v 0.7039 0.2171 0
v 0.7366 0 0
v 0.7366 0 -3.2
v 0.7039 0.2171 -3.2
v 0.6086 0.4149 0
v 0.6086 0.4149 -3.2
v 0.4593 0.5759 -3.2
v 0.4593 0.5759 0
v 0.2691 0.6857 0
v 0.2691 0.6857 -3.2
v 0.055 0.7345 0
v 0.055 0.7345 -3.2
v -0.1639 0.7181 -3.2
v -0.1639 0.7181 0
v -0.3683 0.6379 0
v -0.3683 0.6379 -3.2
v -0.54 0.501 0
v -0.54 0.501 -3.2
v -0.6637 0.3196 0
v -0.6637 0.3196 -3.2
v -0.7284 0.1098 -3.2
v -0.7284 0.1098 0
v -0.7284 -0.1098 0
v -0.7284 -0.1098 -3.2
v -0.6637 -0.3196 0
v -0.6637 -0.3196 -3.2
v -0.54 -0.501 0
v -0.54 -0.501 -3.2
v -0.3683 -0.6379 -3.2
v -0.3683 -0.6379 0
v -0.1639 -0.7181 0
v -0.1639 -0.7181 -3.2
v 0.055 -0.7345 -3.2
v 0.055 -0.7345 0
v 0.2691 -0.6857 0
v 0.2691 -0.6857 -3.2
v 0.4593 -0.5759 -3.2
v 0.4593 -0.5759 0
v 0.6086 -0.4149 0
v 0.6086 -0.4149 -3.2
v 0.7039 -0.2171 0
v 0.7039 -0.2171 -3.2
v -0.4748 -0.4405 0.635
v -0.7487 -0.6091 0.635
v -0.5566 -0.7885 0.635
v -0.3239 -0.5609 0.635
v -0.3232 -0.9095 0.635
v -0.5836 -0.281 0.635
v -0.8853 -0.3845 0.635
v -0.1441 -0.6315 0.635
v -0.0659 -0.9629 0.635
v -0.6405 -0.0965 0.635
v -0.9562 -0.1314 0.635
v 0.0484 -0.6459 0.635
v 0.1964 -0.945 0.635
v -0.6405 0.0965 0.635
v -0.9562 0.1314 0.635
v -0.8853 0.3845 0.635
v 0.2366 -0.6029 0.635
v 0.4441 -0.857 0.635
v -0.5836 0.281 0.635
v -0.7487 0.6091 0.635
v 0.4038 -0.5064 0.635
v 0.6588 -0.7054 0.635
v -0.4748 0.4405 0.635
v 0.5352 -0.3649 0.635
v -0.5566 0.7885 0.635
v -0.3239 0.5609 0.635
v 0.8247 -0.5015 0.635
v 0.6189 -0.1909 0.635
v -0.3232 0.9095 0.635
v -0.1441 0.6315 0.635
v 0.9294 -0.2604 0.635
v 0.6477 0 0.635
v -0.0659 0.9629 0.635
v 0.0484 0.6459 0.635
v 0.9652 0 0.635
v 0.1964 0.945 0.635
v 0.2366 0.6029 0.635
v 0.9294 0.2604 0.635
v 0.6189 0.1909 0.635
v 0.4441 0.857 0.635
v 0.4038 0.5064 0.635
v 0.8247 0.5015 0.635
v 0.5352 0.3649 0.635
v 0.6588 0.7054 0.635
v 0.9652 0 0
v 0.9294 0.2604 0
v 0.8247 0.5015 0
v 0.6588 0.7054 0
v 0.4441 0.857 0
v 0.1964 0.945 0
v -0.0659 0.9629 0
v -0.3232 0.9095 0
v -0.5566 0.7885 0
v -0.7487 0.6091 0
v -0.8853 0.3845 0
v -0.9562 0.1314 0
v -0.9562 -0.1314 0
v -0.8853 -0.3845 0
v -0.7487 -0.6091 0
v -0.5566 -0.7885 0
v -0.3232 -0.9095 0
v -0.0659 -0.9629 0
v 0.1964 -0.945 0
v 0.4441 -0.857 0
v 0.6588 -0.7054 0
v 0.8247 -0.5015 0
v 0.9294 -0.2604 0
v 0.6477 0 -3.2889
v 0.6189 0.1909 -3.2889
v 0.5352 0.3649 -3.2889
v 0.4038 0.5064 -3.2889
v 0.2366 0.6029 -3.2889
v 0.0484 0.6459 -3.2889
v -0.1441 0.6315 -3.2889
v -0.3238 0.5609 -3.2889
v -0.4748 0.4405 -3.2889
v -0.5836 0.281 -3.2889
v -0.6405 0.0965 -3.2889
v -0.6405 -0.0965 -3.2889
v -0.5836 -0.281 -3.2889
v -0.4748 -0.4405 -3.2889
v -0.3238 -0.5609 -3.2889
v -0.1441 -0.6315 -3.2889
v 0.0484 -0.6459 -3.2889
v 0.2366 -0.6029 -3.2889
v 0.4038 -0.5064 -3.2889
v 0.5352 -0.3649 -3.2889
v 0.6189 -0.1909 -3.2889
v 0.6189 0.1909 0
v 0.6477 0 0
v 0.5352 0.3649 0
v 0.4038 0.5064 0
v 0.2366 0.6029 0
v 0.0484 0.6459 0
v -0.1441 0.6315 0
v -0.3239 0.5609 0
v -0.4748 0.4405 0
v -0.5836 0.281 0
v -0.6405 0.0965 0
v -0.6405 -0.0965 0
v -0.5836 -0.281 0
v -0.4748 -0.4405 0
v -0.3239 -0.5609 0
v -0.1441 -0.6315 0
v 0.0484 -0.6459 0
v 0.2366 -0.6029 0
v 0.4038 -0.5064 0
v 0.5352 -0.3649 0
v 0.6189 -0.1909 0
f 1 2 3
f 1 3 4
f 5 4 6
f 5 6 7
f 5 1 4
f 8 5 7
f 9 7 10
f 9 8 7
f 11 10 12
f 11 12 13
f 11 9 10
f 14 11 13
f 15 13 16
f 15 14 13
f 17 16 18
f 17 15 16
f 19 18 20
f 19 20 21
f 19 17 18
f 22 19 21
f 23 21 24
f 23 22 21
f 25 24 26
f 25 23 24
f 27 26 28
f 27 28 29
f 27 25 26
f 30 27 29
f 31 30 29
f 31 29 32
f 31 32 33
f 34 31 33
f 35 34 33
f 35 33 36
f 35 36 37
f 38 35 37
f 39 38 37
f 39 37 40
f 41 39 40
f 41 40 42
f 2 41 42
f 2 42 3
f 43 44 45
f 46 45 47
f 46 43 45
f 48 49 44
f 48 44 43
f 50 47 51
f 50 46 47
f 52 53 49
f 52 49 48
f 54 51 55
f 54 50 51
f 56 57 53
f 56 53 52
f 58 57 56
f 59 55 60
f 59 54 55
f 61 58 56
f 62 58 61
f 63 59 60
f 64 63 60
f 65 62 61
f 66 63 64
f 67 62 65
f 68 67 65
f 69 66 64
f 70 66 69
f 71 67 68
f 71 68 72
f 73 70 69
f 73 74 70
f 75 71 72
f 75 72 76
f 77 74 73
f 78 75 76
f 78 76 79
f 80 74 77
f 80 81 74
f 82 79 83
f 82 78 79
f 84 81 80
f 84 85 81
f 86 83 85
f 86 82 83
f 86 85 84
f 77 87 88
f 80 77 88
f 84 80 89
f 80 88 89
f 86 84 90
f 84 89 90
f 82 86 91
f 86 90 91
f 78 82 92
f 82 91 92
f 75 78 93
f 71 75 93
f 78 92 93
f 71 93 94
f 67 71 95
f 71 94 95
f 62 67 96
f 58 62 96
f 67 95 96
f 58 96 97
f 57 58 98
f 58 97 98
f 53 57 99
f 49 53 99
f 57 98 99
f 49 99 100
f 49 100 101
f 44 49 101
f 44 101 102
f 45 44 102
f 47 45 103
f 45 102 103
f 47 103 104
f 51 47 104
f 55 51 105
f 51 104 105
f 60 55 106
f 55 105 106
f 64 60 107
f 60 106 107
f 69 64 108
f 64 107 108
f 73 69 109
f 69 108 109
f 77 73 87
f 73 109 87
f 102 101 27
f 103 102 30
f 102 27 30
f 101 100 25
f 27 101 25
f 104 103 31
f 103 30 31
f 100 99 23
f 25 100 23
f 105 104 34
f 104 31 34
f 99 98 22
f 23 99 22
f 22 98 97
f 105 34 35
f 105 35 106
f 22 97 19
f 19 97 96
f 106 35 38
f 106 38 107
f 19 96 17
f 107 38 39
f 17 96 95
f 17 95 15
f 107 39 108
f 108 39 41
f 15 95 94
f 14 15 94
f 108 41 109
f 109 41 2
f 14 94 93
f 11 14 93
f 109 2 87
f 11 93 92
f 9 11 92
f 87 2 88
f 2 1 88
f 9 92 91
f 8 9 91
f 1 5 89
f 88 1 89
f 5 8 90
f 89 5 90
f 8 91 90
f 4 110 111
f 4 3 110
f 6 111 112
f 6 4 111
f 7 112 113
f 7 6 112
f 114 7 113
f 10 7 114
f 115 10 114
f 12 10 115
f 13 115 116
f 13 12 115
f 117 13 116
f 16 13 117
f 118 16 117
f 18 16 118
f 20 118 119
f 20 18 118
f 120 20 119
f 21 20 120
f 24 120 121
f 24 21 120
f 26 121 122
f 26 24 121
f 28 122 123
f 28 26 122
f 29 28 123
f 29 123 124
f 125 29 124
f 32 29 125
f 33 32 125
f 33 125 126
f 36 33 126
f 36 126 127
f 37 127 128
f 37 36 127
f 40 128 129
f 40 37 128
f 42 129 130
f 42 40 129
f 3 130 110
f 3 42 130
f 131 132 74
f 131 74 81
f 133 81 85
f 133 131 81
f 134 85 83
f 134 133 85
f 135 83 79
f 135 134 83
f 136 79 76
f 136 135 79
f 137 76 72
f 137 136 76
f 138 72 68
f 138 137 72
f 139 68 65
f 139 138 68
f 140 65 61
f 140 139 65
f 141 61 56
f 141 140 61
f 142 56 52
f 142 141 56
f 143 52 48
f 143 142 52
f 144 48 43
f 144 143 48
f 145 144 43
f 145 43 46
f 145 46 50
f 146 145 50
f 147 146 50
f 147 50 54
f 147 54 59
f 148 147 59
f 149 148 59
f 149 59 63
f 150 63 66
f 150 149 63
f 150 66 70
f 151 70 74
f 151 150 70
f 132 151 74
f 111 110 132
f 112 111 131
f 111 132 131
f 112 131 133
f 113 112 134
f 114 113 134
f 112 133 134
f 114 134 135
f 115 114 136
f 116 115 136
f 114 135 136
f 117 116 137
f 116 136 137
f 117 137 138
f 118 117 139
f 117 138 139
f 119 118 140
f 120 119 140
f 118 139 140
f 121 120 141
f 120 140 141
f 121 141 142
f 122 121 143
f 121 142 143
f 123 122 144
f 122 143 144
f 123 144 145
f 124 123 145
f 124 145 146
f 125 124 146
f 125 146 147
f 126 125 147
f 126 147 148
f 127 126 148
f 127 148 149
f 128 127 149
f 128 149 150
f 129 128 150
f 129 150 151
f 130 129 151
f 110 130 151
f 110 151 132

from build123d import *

# Parameters (mm, degrees)
F0_R     = 0.9652
F0_R_2   = 0.7366
F0_R_3   = 0.6477
F1_DEPTH = 0.635
F2_DEPTH = 3.3


# Not quite as in the source:
# - a fillet or chamfer that OpenCascade refuses, or shapes differently, is made with other operations: its cross-section is extruded or revolved along the edge and cut away or added


with BuildPart() as f1:
    # F0 (on Top) → F1 (new body)
    with BuildSketch(Plane.XY):
        Circle(F0_R)
        Circle(F0_R_2, mode=Mode.SUBTRACT)
        Circle(F0_R_2)
        Circle(F0_R_3, mode=Mode.SUBTRACT)
    extrude(amount=F1_DEPTH)

    # F0 (on Top) → F2 (join)
    with BuildSketch(Plane.XY):
        Circle(F0_R_2)
        Circle(F0_R_3, mode=Mode.SUBTRACT)
    extrude(amount=-F2_DEPTH)

    # F3: chamfer of 0.1 on 1 edges, made by hand

    # F3_s1 → F3_t2 (revolve, cut)
    with BuildSketch(Plane.XZ):
        Polygon((0.6366, -3.3), (0.7366, -3.2), (0.7366, -3.3), align=None)
    revolve(axis=Axis((0, 0, -3.3), (0, 0, 1)), mode=Mode.SUBTRACT)


solid = f1.part
